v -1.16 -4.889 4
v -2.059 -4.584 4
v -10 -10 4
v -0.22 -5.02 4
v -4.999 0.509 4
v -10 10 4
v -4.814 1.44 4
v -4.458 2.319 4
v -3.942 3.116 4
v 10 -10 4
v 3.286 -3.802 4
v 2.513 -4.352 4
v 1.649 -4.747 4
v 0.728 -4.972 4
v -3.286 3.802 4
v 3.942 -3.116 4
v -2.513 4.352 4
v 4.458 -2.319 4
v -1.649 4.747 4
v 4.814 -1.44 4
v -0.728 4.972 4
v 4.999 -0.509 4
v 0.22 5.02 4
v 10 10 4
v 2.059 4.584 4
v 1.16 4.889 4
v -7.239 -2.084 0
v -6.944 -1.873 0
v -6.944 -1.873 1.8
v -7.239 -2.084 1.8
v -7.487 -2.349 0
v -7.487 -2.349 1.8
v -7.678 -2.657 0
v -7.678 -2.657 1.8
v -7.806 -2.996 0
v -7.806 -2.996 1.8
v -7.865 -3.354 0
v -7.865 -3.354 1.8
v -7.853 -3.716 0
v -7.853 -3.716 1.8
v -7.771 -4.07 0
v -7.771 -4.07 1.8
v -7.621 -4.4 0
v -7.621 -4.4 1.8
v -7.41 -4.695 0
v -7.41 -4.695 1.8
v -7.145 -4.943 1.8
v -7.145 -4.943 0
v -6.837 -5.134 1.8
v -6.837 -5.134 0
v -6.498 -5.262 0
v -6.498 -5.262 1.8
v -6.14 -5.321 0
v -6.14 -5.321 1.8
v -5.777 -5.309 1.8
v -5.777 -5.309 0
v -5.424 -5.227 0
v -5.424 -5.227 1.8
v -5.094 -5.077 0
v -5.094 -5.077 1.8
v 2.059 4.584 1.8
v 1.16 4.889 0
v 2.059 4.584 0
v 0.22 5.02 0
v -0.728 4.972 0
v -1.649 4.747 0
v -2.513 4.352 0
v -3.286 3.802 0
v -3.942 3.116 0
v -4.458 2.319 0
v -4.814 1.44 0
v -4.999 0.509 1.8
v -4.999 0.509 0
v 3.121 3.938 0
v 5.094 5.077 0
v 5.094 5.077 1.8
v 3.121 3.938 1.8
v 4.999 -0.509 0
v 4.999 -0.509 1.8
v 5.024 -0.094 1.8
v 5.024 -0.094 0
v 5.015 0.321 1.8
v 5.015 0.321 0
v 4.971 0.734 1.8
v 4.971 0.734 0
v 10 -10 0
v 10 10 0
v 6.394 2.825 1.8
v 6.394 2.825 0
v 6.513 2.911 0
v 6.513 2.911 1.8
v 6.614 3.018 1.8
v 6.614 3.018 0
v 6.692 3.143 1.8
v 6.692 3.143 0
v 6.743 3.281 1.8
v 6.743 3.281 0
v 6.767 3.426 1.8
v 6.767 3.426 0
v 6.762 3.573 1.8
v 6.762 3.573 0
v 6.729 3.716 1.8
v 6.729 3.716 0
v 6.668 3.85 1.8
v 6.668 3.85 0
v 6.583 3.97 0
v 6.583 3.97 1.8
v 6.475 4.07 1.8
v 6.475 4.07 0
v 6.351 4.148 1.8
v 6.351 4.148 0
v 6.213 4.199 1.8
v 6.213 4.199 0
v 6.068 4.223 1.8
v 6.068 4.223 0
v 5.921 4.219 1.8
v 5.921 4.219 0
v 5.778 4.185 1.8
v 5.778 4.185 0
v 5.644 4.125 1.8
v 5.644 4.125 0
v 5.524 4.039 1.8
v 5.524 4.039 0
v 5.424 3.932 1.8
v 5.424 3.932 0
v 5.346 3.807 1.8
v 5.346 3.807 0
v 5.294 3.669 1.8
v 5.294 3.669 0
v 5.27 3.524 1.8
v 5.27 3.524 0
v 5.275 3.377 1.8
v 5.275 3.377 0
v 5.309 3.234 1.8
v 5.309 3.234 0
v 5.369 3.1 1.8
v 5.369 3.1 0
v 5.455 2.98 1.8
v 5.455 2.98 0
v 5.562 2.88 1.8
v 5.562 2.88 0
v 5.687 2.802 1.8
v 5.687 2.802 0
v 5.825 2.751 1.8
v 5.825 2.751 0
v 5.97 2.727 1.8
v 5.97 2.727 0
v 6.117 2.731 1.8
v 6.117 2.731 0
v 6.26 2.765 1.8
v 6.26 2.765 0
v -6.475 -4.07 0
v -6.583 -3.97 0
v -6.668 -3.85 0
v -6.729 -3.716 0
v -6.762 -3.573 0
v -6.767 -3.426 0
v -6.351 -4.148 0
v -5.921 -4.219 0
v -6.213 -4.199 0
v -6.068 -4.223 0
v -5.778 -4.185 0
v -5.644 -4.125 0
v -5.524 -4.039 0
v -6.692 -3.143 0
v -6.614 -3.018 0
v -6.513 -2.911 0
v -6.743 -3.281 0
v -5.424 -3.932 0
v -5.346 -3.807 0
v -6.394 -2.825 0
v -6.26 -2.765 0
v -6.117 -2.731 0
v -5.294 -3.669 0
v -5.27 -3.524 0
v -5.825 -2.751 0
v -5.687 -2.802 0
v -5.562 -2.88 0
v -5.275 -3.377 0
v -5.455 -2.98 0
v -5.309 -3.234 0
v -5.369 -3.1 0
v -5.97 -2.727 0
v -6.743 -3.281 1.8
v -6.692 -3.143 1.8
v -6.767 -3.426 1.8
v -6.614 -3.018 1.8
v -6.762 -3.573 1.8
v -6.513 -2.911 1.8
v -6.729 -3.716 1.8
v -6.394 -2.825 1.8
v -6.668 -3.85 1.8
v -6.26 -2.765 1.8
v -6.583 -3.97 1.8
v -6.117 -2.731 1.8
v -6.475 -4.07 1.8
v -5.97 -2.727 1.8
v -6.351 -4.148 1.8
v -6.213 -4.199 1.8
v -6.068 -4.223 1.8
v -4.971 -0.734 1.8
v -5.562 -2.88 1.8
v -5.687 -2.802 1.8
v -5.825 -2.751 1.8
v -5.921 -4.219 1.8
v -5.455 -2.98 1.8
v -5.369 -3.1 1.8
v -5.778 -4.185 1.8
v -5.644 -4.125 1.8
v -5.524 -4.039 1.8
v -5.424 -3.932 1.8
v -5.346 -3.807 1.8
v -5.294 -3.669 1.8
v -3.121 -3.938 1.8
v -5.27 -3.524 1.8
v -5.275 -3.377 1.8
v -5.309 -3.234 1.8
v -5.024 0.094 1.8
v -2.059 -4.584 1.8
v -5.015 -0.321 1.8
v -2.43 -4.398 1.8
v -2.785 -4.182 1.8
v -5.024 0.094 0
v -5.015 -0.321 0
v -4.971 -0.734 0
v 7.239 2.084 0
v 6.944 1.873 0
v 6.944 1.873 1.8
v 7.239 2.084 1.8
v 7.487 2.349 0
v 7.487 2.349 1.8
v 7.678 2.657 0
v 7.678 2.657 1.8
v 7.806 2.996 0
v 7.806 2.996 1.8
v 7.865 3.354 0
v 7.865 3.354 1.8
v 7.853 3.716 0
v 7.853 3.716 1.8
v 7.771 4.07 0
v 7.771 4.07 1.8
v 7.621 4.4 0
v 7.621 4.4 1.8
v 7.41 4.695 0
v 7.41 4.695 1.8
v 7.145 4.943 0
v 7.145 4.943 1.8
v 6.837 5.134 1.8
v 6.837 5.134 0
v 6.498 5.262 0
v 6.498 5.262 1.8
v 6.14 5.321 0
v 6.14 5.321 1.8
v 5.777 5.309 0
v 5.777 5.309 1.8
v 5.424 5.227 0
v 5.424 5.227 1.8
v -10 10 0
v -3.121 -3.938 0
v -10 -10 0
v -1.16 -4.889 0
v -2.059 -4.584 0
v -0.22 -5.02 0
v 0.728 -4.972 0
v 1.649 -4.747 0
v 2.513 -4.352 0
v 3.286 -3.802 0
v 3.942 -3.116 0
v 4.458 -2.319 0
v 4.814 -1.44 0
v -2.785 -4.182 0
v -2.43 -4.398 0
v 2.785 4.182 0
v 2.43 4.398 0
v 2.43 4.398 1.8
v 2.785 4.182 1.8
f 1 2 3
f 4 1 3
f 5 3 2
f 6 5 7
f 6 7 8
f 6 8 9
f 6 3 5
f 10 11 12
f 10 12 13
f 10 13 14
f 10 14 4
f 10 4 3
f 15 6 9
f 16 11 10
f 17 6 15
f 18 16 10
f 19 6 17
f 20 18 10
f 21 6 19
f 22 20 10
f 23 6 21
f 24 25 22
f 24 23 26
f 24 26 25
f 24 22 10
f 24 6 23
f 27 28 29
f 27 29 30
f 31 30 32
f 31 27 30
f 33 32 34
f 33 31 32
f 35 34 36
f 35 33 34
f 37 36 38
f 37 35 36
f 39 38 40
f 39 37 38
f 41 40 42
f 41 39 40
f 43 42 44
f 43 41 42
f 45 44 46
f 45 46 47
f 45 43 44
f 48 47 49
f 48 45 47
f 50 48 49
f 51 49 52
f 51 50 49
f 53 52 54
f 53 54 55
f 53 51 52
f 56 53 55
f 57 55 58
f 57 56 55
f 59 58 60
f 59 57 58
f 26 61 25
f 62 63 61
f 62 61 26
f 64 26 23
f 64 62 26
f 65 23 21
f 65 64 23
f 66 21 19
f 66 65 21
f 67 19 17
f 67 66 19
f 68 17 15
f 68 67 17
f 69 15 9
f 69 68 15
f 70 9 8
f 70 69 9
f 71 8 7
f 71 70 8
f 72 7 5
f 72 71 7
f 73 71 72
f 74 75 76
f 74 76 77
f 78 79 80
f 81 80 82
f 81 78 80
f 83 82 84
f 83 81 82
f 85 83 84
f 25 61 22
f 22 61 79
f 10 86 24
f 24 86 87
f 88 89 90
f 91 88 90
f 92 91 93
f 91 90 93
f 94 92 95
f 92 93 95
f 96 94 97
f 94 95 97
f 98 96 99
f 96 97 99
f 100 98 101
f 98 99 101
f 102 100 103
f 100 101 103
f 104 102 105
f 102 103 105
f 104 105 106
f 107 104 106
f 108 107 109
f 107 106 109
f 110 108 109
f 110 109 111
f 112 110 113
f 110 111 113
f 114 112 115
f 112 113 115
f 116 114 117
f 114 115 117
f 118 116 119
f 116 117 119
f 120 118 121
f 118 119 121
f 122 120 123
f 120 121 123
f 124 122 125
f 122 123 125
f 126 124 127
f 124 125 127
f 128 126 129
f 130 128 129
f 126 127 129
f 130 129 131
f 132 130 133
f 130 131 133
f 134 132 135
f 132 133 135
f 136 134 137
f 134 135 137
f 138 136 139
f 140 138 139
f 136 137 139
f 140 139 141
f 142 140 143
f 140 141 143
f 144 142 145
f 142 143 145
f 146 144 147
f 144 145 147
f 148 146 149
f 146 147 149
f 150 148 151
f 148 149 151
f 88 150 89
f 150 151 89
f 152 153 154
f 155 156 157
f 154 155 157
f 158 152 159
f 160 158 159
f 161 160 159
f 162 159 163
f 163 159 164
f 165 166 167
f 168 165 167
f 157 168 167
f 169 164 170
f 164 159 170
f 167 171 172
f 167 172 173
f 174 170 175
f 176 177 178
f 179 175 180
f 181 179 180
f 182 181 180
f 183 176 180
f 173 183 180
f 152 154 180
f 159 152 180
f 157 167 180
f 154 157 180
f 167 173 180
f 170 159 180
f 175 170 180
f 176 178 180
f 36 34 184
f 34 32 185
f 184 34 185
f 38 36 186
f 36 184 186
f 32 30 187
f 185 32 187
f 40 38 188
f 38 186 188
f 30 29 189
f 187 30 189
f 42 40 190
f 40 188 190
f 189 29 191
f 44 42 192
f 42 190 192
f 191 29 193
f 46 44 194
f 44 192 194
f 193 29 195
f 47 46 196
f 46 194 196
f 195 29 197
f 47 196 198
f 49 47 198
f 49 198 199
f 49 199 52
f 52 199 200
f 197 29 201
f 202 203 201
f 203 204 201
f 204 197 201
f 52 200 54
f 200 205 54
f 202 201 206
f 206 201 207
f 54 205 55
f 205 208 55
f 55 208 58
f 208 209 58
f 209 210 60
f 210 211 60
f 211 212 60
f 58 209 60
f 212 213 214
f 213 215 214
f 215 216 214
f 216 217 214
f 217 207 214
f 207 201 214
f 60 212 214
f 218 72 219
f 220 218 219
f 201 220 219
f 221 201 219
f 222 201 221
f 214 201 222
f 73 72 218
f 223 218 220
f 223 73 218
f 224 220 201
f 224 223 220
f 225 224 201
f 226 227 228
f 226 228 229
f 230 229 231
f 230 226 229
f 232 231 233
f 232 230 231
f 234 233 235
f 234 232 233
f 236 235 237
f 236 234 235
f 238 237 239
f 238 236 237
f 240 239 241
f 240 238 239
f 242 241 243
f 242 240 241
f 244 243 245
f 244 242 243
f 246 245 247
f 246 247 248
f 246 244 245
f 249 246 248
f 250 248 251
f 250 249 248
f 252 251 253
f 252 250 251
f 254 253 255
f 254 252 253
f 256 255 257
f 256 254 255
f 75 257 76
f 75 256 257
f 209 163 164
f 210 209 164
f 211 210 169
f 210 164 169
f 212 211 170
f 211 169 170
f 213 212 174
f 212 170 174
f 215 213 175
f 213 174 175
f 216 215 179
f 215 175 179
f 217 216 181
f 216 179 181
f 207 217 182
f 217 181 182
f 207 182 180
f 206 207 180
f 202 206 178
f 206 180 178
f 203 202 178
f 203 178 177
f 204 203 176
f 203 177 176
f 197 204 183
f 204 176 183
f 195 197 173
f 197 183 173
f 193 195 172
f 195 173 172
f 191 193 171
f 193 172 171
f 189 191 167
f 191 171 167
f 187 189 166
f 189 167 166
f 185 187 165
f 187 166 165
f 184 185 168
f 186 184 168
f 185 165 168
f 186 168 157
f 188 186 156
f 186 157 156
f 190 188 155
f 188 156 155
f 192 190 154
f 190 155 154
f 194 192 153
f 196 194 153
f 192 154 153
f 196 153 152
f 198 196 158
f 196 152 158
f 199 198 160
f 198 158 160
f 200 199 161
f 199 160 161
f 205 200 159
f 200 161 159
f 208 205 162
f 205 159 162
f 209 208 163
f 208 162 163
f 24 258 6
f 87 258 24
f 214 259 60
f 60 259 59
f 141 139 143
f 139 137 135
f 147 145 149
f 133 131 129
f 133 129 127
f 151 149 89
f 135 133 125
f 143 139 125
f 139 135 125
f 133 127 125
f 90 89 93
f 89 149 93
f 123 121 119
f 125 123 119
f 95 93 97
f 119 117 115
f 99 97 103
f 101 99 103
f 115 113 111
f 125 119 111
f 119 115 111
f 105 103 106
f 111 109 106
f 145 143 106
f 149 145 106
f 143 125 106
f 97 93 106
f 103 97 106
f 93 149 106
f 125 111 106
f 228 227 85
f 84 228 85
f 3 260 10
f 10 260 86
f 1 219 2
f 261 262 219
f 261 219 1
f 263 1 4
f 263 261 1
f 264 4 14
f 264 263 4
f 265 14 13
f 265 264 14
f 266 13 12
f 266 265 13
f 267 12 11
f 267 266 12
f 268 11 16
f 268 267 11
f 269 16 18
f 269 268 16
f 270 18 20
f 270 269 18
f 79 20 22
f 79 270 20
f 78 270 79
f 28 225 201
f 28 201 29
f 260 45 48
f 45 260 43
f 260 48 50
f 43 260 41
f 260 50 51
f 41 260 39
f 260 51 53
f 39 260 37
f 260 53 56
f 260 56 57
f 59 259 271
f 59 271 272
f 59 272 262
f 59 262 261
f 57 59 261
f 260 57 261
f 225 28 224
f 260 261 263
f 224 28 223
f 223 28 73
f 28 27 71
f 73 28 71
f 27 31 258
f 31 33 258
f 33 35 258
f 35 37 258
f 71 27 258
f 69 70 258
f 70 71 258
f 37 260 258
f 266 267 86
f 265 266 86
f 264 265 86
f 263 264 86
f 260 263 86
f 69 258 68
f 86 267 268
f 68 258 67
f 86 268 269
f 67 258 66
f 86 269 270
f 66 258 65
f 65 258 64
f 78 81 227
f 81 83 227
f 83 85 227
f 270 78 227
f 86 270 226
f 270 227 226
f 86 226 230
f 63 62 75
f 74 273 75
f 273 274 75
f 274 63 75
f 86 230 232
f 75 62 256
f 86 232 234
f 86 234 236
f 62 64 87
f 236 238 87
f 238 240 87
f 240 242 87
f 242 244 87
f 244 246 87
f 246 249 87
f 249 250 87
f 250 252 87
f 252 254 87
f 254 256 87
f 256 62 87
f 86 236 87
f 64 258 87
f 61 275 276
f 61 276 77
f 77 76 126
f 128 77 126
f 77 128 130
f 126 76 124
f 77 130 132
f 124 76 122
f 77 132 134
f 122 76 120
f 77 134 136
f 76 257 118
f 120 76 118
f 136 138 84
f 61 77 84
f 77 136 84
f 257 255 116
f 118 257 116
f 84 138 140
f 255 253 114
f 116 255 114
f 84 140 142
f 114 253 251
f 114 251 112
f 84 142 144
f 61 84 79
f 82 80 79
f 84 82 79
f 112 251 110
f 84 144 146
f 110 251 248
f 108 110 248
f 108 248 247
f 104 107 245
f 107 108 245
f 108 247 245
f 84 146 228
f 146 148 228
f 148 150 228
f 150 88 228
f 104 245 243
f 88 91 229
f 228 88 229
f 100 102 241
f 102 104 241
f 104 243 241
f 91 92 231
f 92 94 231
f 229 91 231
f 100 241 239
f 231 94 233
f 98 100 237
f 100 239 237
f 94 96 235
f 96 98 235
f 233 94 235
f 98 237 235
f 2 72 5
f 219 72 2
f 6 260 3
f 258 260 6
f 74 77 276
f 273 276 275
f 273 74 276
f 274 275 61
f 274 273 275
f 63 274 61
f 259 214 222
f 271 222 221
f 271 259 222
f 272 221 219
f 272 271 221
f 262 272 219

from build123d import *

# Parameters (mm, degrees)
PAD_DEPTH            = 18
SKETCH002_R          = 0.75
PAD001_DEPTH         = 1.8
CYLINDER_R           = 5.025
CYLINDER_DEPTH       = 1.8
BODY_PLACEMENT_ANGLE = 60
BOX_W                = 20
BOX_H                = 20
BOX_DEPTH            = 4


with BuildPart() as motorbody:
    # Sketch001 → Pad (new body)
    with BuildSketch(Plane.XY):
        with BuildLine():
            ThreePointArc((-2.940238, 4.075), (-5.025, 0), (-2.940238, -4.075))
            Line((-2.940238, -4.075), (2.940238, -4.075))
            ThreePointArc((2.940238, -4.075), (5.025, 0), (2.940238, 4.075))
            Line((-2.940238, 4.075), (2.940238, 4.075))
        make_face()
    extrude(amount=PAD_DEPTH)

    # Sketch002 → Pad001 (join)
    with BuildSketch(Plane.XY):
        with BuildLine():
            ThreePointArc((1.85, 6.95), (0, 8.8), (-1.85, 6.95))
            Line((-1.85, 6.95), (-1.85, -6.950003))
            ThreePointArc((-1.85, -6.950003), (2e-06, -8.8), (1.85, -6.949999))
            Line((1.85, 6.95), (1.85, -6.949999))
        make_face()
        with Locations((0, 6.95)):
            Circle(SKETCH002_R, mode=Mode.SUBTRACT)
        with Locations((0, -6.95)):
            Circle(SKETCH002_R, mode=Mode.SUBTRACT)
    extrude(amount=PAD001_DEPTH)

    # Cylinder → Cylinder (join)
    with BuildSketch(Plane.XY):
        Circle(CYLINDER_R)
    extrude(amount=CYLINDER_DEPTH)


with BuildPart() as motorbody_1:
    # Body placement: moved
    add(motorbody.part.rotate(Axis((0, 0, 0), (0, 0, -1)), BODY_PLACEMENT_ANGLE))


with BuildPart() as motortestholder:
    # Box → Box (new body)
    with BuildSketch(Plane(origin=(-10, -10, 0), x_dir=(1, 0, 0), z_dir=(0, 0, 1))):
        with Locations((10, 10)):
            Rectangle(BOX_W, BOX_H)
    extrude(amount=BOX_DEPTH)

    # Cut: cut MotorBody
    add(motorbody_1.part, mode=Mode.SUBTRACT)


solid = motortestholder.part
